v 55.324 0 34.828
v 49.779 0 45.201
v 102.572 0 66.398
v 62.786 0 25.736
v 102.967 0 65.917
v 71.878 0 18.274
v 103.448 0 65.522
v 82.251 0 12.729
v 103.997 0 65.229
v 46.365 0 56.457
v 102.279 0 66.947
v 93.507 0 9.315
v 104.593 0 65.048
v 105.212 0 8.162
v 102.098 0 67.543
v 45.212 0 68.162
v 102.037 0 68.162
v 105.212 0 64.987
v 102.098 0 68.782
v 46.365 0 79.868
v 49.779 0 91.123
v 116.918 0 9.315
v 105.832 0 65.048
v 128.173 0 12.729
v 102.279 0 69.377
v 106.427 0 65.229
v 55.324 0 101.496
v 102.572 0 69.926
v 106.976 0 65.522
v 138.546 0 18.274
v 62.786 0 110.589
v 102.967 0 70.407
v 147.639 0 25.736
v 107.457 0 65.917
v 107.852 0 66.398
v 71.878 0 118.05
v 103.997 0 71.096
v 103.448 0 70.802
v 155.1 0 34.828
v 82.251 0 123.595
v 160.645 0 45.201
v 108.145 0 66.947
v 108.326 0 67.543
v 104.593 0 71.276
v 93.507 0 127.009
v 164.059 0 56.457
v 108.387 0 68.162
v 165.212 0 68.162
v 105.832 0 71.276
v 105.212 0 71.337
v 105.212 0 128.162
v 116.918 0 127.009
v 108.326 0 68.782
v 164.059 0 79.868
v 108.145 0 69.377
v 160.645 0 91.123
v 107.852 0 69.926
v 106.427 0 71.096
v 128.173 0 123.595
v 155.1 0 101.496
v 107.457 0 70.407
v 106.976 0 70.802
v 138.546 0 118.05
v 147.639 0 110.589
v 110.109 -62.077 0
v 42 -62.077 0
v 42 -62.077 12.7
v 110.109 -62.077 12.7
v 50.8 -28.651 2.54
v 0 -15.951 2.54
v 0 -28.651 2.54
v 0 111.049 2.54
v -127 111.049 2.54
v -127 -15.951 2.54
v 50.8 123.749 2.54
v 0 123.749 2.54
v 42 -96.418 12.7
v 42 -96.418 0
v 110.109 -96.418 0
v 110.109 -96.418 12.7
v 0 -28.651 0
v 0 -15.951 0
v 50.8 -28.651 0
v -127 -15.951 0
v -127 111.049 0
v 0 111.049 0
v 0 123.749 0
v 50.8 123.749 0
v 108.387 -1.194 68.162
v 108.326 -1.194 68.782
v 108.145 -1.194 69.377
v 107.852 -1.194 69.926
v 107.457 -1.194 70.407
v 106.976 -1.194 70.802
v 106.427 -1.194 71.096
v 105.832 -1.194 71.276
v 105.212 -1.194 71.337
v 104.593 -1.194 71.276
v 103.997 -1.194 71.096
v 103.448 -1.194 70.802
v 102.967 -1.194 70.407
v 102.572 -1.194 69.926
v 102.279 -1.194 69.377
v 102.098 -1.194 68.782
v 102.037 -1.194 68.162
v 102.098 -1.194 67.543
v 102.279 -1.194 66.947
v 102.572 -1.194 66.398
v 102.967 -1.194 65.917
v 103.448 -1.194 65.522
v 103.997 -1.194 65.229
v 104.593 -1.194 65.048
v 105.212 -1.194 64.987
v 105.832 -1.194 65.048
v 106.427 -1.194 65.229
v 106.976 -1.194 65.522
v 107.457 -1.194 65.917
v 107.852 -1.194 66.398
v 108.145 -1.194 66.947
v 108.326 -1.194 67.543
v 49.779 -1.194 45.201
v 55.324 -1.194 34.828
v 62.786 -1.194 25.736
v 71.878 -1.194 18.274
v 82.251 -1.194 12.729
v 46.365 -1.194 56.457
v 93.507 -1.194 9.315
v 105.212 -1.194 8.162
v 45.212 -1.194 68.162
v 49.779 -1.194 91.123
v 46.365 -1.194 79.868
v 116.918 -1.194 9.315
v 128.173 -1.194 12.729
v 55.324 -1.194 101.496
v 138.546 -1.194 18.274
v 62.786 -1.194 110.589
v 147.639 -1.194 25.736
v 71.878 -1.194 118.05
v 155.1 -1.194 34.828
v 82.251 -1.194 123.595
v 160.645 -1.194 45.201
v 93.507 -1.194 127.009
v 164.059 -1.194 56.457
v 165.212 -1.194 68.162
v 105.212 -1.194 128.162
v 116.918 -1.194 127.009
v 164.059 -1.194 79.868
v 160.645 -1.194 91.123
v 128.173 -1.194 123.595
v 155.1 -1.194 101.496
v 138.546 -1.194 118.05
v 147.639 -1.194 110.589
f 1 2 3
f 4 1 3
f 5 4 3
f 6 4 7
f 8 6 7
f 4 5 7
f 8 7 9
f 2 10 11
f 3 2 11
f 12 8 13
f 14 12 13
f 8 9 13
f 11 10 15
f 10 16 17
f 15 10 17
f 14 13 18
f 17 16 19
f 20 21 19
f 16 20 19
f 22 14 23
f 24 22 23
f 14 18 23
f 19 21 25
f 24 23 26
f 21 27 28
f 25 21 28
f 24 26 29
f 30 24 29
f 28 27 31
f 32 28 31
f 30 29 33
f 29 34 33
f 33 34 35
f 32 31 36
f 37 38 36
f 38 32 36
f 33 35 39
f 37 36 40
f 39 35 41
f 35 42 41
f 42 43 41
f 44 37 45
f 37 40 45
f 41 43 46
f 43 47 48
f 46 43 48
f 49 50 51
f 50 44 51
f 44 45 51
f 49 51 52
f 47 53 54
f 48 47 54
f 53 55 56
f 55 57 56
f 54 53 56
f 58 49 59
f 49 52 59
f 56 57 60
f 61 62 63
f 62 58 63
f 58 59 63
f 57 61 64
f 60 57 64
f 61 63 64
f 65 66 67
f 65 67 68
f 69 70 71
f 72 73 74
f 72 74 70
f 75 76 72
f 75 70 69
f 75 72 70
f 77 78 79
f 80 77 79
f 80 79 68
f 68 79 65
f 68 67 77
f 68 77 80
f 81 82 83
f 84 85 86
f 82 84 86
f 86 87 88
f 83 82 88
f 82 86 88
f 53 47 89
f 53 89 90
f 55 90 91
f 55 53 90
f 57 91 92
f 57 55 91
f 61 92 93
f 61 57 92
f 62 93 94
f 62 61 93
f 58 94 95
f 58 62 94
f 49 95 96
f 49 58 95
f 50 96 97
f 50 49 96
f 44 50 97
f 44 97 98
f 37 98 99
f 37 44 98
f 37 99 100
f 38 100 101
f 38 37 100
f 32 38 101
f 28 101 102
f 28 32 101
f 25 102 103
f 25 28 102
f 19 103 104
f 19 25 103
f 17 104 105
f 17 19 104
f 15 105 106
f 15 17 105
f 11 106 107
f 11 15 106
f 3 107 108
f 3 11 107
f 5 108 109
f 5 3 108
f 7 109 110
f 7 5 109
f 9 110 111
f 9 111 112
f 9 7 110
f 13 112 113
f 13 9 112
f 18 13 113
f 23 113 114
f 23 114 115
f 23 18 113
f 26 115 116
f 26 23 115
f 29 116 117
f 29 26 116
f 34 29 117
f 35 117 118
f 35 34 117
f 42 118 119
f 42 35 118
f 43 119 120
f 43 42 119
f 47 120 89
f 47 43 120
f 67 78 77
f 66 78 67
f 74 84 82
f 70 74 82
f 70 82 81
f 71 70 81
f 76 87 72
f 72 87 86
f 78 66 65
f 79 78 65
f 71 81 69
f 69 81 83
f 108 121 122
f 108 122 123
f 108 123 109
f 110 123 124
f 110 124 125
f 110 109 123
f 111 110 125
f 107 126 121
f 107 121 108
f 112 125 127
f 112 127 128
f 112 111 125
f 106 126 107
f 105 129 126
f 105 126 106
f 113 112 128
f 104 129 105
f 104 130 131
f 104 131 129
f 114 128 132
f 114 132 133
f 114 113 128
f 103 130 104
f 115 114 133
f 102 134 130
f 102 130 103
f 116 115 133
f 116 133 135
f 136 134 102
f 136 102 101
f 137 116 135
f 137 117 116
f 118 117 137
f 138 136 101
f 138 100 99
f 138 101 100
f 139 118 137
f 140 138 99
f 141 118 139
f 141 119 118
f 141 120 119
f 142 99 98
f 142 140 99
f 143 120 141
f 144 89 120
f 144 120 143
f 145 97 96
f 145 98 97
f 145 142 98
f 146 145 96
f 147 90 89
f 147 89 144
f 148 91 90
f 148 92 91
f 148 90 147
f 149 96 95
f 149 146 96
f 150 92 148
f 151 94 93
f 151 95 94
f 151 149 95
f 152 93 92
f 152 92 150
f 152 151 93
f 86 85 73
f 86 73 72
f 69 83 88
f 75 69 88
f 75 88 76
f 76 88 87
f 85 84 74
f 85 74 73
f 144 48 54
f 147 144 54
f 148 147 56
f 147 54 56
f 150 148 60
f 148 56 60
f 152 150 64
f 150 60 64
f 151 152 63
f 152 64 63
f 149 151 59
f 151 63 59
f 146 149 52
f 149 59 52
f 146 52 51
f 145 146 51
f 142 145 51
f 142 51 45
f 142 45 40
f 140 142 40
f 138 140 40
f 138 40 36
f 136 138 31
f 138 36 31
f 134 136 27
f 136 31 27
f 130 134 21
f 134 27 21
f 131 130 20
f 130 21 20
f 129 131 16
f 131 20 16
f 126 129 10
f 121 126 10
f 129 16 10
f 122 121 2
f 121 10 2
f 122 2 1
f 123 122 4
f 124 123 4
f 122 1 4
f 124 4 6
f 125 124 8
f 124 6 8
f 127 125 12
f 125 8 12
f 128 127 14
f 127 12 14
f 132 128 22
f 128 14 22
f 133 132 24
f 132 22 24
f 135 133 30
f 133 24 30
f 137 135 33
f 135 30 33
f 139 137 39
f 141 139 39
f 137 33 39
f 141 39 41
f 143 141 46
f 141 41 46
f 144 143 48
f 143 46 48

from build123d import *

# Parameters (mm, degrees)
F0_W     = 127
F0_H     = 127
F1_DEPTH = 2.54
F2_R     = 60
F2_R_2   = 3.175
F3_DEPTH = 1.1938
F4_W     = 68.108961
F4_H     = 34.34065
F5_DEPTH = 12.7


with BuildPart() as f1:
    # F0 (on Top) → F1 (new body)
    with BuildSketch(Plane.XY):
        with Locations((-63.5, 47.549406)):
            Rectangle(F0_W, F0_H)
        Polygon((0, 123.749406), (0, 111.049406), (0, -15.950594), (0, -28.650594), (50.8, -28.650594), (50.8, 123.749406), align=None)
    extrude(amount=F1_DEPTH)


with BuildPart() as f3:
    # F2 (on Front) → F3 (new body)
    with BuildSketch(Plane.XZ):
        with Locations((105.212152, 68.162248)):
            Circle(F2_R)
        with Locations((105.212152, 68.162248)):
            Circle(F2_R_2, mode=Mode.SUBTRACT)
    extrude(amount=F3_DEPTH)


with BuildPart() as f5:
    # F4 (on Top) → F5 (new body)
    with BuildSketch(Plane.XY):
        with Locations((76.054343, -79.247311)):
            Rectangle(F4_W, F4_H)
    extrude(amount=F5_DEPTH)


solid = Compound([f1.part, f3.part, f5.part])
